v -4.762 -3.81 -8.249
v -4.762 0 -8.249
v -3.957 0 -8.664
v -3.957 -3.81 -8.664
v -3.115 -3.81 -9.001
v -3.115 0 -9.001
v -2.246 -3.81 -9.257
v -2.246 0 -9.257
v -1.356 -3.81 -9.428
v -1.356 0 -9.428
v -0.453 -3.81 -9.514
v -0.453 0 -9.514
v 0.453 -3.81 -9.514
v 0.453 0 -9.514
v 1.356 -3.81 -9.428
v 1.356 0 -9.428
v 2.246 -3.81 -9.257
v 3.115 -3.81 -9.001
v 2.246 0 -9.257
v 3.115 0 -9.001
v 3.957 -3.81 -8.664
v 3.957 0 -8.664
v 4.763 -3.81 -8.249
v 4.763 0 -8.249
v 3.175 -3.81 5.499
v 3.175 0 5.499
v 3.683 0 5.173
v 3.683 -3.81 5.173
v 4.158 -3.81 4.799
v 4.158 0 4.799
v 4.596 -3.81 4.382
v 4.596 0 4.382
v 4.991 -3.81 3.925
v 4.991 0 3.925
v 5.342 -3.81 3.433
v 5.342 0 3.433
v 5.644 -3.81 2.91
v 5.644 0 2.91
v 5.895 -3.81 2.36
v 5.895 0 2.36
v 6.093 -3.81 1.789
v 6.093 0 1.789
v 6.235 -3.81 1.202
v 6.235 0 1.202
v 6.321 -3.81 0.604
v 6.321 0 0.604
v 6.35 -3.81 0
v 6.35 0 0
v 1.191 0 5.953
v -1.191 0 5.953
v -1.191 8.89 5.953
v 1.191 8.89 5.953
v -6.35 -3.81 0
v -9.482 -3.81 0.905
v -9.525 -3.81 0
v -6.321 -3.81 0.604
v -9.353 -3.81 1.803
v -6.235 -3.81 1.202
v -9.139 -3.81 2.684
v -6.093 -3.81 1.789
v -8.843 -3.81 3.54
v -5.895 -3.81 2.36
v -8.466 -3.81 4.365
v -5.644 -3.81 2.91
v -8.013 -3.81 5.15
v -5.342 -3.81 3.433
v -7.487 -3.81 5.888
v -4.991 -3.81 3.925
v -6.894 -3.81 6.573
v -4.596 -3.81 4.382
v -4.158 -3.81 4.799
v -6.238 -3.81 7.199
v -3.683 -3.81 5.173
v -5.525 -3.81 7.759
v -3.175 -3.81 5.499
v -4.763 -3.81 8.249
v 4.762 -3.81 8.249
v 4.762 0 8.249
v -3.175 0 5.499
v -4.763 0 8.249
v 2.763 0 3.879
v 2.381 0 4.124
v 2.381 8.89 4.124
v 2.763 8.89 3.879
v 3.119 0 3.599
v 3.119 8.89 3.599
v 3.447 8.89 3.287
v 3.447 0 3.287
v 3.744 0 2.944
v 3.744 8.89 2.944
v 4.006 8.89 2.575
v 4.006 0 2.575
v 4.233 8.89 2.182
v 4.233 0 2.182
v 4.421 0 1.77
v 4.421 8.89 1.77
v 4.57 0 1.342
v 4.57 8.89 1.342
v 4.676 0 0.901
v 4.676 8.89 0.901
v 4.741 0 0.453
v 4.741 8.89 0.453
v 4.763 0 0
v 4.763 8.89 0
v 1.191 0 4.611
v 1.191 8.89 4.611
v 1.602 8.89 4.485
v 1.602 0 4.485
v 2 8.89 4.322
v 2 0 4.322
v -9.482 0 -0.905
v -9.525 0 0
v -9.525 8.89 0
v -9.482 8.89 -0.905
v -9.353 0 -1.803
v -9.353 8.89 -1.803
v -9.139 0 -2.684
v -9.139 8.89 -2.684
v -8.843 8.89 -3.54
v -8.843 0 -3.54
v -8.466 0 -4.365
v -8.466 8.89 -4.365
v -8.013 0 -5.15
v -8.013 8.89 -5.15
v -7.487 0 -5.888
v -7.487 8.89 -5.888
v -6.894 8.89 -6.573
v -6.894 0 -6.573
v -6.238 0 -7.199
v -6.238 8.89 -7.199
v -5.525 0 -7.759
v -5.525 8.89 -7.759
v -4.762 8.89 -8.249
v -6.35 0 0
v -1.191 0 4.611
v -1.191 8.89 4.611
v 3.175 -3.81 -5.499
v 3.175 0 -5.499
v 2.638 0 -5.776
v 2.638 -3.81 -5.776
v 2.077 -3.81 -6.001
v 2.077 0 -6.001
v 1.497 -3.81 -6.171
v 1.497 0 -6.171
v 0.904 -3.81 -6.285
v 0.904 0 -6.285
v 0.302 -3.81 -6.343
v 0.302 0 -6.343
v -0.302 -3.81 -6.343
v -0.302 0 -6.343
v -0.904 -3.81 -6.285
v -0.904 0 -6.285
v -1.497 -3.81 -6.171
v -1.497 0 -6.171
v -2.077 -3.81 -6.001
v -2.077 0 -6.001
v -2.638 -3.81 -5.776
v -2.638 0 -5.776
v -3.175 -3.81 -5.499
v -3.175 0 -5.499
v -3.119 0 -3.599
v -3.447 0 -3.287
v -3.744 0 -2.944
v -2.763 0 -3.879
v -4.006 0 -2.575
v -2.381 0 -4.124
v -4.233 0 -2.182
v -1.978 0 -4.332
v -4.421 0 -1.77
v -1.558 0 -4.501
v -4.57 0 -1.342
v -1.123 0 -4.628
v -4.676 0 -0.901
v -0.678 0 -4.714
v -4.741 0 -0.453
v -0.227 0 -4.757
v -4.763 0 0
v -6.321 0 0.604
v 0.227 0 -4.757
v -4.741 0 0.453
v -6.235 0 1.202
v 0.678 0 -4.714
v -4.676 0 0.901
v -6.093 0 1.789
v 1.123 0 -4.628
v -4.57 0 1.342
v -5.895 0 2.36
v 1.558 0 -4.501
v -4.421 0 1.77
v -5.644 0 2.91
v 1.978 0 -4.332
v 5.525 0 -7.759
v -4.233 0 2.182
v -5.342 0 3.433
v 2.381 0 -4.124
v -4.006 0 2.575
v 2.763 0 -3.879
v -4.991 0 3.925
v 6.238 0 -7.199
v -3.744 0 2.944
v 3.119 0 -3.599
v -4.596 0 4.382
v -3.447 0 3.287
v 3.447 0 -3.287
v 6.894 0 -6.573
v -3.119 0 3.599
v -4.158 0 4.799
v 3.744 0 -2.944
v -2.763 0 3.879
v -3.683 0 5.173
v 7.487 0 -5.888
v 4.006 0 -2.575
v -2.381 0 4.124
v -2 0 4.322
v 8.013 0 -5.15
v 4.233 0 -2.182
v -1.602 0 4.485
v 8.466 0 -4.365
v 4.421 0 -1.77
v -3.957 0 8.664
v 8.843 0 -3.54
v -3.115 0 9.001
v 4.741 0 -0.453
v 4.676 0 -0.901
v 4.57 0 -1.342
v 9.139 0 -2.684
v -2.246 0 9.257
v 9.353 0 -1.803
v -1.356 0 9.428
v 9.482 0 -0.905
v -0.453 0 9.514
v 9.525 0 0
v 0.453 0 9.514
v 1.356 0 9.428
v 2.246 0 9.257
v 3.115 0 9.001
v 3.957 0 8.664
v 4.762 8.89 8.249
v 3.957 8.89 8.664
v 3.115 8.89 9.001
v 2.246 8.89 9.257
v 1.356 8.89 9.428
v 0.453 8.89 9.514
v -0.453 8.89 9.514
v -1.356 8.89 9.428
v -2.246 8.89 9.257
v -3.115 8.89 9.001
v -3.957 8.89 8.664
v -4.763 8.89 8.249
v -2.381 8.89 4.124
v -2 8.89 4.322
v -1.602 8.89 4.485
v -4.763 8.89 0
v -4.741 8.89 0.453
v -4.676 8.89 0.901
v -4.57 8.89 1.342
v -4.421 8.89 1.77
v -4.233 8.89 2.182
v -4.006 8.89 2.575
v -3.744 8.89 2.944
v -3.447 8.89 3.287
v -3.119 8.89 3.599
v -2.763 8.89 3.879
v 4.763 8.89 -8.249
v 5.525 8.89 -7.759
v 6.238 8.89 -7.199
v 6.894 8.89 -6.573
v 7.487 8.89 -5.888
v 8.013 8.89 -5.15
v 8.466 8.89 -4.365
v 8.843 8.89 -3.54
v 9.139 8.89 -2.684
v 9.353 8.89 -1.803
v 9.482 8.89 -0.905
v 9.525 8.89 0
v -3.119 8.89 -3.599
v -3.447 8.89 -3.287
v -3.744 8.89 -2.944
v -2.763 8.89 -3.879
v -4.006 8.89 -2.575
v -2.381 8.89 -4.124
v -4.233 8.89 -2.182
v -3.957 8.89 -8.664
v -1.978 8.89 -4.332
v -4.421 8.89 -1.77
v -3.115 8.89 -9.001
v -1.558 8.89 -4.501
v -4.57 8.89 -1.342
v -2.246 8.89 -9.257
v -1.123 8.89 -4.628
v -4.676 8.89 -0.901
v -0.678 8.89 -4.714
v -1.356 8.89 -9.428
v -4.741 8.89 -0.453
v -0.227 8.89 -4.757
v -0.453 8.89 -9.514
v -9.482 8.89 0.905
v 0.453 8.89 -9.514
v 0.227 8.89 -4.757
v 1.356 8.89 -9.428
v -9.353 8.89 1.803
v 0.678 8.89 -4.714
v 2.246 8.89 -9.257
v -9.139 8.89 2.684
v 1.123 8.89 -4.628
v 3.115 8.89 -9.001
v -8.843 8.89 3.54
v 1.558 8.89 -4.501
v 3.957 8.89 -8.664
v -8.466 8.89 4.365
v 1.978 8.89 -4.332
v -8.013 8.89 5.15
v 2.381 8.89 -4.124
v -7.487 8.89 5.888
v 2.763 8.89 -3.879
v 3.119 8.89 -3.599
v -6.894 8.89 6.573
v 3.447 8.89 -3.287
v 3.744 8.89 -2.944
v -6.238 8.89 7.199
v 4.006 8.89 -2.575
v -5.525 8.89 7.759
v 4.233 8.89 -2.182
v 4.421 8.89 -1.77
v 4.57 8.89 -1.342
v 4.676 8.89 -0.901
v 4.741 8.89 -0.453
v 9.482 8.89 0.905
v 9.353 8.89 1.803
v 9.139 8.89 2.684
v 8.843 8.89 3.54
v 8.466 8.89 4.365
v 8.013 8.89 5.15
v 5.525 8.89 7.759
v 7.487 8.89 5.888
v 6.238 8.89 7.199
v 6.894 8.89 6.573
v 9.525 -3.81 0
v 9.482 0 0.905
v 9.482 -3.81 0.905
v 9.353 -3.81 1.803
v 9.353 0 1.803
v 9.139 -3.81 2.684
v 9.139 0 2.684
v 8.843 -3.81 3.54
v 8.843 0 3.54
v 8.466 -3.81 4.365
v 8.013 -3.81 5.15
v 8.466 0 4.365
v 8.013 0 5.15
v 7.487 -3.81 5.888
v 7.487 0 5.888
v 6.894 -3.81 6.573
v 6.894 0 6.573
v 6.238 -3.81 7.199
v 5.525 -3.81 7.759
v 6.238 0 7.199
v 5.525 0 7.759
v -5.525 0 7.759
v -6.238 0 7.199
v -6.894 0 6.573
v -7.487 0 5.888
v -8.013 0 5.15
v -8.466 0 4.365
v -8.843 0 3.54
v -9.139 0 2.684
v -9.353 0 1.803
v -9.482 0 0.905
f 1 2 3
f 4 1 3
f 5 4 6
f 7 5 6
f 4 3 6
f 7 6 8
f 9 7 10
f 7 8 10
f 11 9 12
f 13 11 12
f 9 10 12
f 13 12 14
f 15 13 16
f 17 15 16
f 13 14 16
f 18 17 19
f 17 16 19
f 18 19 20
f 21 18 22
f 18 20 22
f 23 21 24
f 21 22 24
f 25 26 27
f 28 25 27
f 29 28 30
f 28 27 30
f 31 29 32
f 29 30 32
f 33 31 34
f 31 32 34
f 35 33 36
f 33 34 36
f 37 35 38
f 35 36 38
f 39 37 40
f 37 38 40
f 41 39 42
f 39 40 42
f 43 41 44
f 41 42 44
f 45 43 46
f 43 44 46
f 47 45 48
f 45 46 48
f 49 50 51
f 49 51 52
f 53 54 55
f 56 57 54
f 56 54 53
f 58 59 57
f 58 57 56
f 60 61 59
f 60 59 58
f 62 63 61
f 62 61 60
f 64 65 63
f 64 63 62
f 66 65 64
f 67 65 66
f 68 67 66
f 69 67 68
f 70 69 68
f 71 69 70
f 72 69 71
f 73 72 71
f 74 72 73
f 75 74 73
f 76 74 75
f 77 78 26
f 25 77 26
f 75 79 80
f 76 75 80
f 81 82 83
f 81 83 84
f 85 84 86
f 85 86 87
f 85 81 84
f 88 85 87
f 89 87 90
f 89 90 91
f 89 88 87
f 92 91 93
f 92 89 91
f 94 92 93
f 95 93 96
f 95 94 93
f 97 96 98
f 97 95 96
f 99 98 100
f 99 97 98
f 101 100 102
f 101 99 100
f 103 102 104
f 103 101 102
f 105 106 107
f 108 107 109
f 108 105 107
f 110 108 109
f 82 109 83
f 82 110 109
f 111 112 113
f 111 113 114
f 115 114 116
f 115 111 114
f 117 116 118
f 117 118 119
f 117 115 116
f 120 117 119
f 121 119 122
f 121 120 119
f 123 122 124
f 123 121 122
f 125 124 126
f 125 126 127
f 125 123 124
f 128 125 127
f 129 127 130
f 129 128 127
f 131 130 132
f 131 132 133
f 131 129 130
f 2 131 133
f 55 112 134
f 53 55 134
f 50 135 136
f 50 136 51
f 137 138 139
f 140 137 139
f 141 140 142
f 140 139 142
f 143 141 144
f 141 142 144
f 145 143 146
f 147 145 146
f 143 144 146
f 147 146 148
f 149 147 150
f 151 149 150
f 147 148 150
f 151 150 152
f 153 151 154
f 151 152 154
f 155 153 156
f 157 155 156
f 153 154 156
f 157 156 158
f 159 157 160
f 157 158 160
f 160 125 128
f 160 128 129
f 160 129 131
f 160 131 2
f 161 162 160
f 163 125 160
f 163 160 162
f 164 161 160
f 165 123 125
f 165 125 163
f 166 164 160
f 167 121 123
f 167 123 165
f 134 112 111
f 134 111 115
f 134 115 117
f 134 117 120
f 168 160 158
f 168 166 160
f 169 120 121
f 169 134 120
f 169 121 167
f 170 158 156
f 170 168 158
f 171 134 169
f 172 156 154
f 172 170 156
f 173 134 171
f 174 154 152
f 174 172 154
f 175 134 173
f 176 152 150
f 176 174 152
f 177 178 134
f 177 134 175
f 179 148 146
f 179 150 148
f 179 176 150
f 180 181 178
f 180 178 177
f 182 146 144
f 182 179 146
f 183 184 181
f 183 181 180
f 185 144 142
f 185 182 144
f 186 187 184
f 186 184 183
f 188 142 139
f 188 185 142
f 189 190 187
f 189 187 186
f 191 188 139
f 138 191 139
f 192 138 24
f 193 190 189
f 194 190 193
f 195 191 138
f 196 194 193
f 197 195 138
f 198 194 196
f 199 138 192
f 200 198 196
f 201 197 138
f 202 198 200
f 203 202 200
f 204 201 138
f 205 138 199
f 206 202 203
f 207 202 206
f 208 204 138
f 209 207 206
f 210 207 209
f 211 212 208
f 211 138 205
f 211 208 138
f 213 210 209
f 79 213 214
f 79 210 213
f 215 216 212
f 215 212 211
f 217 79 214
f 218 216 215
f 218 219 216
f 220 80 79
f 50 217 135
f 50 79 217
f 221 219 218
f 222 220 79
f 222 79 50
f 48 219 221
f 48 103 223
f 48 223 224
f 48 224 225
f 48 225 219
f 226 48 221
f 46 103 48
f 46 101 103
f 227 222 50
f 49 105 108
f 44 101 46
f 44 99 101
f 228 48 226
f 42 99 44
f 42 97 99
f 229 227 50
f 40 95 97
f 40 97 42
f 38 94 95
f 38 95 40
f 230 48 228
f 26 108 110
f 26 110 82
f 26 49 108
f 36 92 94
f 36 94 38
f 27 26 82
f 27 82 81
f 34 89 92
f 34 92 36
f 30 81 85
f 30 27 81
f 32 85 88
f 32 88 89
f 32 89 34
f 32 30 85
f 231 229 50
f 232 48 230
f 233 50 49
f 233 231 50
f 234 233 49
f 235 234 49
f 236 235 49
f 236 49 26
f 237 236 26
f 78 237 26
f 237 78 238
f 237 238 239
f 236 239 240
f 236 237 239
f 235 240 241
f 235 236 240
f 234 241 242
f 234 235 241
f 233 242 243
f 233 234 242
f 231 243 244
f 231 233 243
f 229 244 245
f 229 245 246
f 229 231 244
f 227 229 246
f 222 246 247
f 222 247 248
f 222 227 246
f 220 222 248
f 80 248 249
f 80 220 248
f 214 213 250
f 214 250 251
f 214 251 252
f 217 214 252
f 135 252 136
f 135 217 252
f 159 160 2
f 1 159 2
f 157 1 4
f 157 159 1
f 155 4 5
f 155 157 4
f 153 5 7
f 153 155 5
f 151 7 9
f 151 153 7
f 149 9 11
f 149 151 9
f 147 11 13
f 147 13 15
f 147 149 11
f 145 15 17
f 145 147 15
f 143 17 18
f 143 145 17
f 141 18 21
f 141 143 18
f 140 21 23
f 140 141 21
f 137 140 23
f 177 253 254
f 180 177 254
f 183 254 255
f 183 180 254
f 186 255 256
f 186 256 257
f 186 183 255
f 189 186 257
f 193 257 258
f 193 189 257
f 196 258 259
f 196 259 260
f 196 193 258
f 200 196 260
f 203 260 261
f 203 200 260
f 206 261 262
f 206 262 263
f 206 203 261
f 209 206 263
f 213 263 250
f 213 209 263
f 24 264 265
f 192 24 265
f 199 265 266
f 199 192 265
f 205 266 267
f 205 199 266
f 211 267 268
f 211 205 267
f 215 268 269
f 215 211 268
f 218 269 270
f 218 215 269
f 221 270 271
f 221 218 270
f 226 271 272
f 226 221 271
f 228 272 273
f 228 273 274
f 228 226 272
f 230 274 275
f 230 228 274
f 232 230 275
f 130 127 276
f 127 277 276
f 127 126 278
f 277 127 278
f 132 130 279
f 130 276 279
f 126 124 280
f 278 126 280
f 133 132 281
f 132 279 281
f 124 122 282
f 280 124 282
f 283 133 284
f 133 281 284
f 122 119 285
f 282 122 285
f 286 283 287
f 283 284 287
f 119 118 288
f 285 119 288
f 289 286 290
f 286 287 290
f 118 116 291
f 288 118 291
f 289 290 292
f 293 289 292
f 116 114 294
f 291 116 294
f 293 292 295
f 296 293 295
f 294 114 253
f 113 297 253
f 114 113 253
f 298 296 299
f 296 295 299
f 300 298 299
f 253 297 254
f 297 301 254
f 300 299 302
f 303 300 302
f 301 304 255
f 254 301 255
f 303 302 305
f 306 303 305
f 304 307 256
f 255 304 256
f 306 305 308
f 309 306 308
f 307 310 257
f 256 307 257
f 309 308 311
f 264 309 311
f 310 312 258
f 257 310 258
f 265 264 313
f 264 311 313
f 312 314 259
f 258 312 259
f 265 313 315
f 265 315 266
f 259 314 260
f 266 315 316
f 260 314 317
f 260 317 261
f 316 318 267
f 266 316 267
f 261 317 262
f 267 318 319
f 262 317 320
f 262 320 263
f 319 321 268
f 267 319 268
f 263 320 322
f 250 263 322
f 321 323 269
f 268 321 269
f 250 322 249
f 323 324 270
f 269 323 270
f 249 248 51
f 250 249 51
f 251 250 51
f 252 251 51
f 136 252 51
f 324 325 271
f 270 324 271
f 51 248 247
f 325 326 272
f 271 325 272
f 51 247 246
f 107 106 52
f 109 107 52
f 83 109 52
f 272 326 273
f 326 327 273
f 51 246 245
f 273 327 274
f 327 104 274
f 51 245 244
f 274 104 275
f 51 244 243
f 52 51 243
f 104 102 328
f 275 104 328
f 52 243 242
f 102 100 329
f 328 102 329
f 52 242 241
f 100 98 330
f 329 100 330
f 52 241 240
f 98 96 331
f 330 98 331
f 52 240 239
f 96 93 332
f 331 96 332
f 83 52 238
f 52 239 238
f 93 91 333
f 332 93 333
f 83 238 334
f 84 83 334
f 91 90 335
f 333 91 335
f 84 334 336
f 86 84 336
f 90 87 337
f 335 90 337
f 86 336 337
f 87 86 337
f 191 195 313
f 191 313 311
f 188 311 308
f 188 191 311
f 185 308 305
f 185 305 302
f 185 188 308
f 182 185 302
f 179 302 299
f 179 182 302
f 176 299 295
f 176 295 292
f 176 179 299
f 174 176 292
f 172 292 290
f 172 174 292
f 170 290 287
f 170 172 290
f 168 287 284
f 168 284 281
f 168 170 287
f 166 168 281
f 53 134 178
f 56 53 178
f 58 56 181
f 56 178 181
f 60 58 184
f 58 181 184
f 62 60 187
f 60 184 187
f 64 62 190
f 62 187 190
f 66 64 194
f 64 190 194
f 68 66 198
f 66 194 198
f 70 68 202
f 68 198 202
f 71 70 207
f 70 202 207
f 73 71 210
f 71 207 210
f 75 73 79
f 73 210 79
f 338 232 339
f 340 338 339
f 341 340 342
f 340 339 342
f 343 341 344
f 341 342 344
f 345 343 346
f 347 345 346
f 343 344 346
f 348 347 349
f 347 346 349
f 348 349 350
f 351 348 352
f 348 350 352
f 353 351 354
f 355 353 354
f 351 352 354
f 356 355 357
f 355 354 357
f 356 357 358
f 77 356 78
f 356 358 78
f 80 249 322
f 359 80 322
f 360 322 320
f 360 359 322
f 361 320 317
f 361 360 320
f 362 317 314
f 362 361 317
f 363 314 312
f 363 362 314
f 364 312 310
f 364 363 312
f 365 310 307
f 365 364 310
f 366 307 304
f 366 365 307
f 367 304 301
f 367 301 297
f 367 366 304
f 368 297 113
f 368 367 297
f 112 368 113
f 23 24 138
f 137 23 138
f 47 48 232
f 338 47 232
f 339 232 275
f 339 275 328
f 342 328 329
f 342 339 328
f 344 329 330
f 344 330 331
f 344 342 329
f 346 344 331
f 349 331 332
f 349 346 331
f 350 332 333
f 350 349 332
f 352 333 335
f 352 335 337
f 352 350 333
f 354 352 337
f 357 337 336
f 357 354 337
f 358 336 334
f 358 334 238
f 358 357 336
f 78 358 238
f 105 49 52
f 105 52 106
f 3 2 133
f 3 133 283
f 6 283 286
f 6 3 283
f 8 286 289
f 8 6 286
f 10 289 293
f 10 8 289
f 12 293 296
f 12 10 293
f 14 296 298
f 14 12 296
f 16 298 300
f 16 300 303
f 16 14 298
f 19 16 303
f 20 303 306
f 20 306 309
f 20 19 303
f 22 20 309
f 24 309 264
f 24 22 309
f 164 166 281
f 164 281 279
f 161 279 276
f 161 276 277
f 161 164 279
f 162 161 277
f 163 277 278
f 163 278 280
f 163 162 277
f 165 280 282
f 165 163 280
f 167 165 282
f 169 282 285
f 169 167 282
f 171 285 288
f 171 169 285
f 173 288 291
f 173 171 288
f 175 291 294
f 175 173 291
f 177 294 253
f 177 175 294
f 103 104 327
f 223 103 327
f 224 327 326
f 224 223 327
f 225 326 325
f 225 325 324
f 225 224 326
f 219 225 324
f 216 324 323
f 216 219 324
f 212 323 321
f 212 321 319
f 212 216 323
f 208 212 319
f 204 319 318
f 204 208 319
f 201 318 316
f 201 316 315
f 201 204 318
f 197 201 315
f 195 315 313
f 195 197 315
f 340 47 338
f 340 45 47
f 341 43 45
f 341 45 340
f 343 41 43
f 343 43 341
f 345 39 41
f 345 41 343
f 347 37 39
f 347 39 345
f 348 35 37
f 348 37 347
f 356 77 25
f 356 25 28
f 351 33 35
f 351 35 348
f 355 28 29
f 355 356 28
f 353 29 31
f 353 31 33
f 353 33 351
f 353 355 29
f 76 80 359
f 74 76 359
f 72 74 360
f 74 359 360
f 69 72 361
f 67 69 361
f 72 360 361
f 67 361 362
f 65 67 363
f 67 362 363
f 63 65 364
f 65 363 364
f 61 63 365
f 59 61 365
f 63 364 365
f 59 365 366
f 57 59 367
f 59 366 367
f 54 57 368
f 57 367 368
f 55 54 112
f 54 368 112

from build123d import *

# Parameters (mm, degrees)
F1_DEPTH = 8.89
F2_DEPTH = 3.81


with BuildPart() as f1:
    # F0 (on Front) → F1 (new body)
    with BuildSketch(Plane.XZ):
        with BuildLine():
            Line((6.35, 0), (9.525, 0))
            ThreePointArc((9.525, 0), (8.248891971, 4.7625), (4.7625, 8.248891971))
            Line((4.7625, 8.248891971), (3.175, 5.499261314))
            ThreePointArc((3.175, 5.499261314), (5.499261314, 3.175), (6.35, 0))
        make_face()
        with BuildLine():
            Line((3.175, 5.499261314), (4.7625, 8.248891971))
            ThreePointArc((4.7625, 8.248891971), (0, 9.525), (-4.7625, 8.248891971))
            Line((-4.7625, 8.248891971), (-3.175, 5.499261314))
            ThreePointArc((-3.175, 5.499261314), (0, 6.35), (3.175, 5.499261314))
        make_face()
        with BuildLine():
            Line((4.7625, 0), (6.35, 0))
            ThreePointArc((6.35, 0), (5.499261314, 3.175), (3.175, 5.499261314))
            Line((3.175, 5.499261314), (2.38125, 4.1244459855))
            ThreePointArc((2.38125, 4.1244459855), (4.1244459855, 2.38125), (4.7625, 0))
        make_face()
        with BuildLine():
            Line((2.38125, 4.1244459855), (3.175, 5.499261314))
            ThreePointArc((3.175, 5.499261314), (0, 6.35), (-3.175, 5.499261314))
            Line((-3.175, 5.499261314), (-2.38125, 4.1244459855))
            ThreePointArc((-2.38125, 4.1244459855), (-1.8024489876, 4.4082404536), (-1.190625, 4.6112707966))
            Line((-1.190625, 4.6112707966), (-1.190625, 5.953125))
            Line((-1.190625, 5.953125), (1.190625, 5.953125))
            Line((1.190625, 5.953125), (1.190625, 4.6112707966))
            ThreePointArc((1.190625, 4.6112707966), (1.8024489876, 4.4082404536), (2.38125, 4.1244459855))
        make_face()
        with BuildLine():
            ThreePointArc((4.7625, -8.248891971), (8.248891971, -4.7625), (9.525, 0))
            Line((9.525, 0), (6.35, 0))
            ThreePointArc((6.35, 0), (5.499261314, -3.175), (3.175, -5.499261314))
            Line((3.175, -5.499261314), (4.7625, -8.248891971))
        make_face()
        with BuildLine():
            Line((-2.38125, 4.1244459855), (-3.175, 5.499261314))
            ThreePointArc((-3.175, 5.499261314), (-5.499261314, 3.175), (-6.35, 0))
            Line((-6.35, 0), (-4.7625, 0))
            ThreePointArc((-4.7625, 0), (-4.1244459855, 2.38125), (-2.38125, 4.1244459855))
        make_face()
        with BuildLine():
            ThreePointArc((-6.35, 0), (-5.499261314, -3.175), (-3.175, -5.499261314))
            Line((-3.175, -5.499261314), (-2.38125, -4.1244459855))
            ThreePointArc((-2.38125, -4.1244459855), (-4.1244459855, -2.38125), (-4.7625, 0))
            Line((-4.7625, 0), (-6.35, 0))
        make_face()
        with BuildLine():
            ThreePointArc((-9.525, 0), (-8.248891971, -4.7625), (-4.7625, -8.248891971))
            Line((-4.7625, -8.248891971), (-3.175, -5.499261314))
            ThreePointArc((-3.175, -5.499261314), (-5.499261314, -3.175), (-6.35, 0))
            Line((-6.35, 0), (-9.525, 0))
        make_face()
        with BuildLine():
            ThreePointArc((-4.7625, -8.248891971), (0, -9.525), (4.7625, -8.248891971))
            Line((4.7625, -8.248891971), (3.175, -5.499261314))
            ThreePointArc((3.175, -5.499261314), (0, -6.35), (-3.175, -5.499261314))
            Line((-3.175, -5.499261314), (-4.7625, -8.248891971))
        make_face()
        with BuildLine():
            ThreePointArc((-3.175, -5.499261314), (0, -6.35), (3.175, -5.499261314))
            Line((3.175, -5.499261314), (2.38125, -4.1244459855))
            ThreePointArc((2.38125, -4.1244459855), (0, -4.7625), (-2.38125, -4.1244459855))
            Line((-2.38125, -4.1244459855), (-3.175, -5.499261314))
        make_face()
        with BuildLine():
            ThreePointArc((3.175, -5.499261314), (5.499261314, -3.175), (6.35, 0))
            Line((6.35, 0), (4.7625, 0))
            ThreePointArc((4.7625, 0), (4.1244459855, -2.38125), (2.38125, -4.1244459855))
            Line((2.38125, -4.1244459855), (3.175, -5.499261314))
        make_face()
        with BuildLine():
            Line((-3.175, 5.499261314), (-4.7625, 8.248891971))
            ThreePointArc((-4.7625, 8.248891971), (-8.248891971, 4.7625), (-9.525, 0))
            Line((-9.525, 0), (-6.35, 0))
            ThreePointArc((-6.35, 0), (-5.499261314, 3.175), (-3.175, 5.499261314))
        make_face()
    extrude(amount=-F1_DEPTH)

    # F0 (on Front) → F2 (join)
    with BuildSketch(Plane.XZ):
        with BuildLine():
            Line((6.35, 0), (9.525, 0))
            ThreePointArc((9.525, 0), (8.248891971, 4.7625), (4.7625, 8.248891971))
            Line((4.7625, 8.248891971), (3.175, 5.499261314))
            ThreePointArc((3.175, 5.499261314), (5.499261314, 3.175), (6.35, 0))
        make_face()
        with BuildLine():
            ThreePointArc((-4.7625, -8.248891971), (0, -9.525), (4.7625, -8.248891971))
            Line((4.7625, -8.248891971), (3.175, -5.499261314))
            ThreePointArc((3.175, -5.499261314), (0, -6.35), (-3.175, -5.499261314))
            Line((-3.175, -5.499261314), (-4.7625, -8.248891971))
        make_face()
        with BuildLine():
            Line((-3.175, 5.499261314), (-4.7625, 8.248891971))
            ThreePointArc((-4.7625, 8.248891971), (-8.248891971, 4.7625), (-9.525, 0))
            Line((-9.525, 0), (-6.35, 0))
            ThreePointArc((-6.35, 0), (-5.499261314, 3.175), (-3.175, 5.499261314))
        make_face()
    extrude(amount=F2_DEPTH)


solid = f1.part
